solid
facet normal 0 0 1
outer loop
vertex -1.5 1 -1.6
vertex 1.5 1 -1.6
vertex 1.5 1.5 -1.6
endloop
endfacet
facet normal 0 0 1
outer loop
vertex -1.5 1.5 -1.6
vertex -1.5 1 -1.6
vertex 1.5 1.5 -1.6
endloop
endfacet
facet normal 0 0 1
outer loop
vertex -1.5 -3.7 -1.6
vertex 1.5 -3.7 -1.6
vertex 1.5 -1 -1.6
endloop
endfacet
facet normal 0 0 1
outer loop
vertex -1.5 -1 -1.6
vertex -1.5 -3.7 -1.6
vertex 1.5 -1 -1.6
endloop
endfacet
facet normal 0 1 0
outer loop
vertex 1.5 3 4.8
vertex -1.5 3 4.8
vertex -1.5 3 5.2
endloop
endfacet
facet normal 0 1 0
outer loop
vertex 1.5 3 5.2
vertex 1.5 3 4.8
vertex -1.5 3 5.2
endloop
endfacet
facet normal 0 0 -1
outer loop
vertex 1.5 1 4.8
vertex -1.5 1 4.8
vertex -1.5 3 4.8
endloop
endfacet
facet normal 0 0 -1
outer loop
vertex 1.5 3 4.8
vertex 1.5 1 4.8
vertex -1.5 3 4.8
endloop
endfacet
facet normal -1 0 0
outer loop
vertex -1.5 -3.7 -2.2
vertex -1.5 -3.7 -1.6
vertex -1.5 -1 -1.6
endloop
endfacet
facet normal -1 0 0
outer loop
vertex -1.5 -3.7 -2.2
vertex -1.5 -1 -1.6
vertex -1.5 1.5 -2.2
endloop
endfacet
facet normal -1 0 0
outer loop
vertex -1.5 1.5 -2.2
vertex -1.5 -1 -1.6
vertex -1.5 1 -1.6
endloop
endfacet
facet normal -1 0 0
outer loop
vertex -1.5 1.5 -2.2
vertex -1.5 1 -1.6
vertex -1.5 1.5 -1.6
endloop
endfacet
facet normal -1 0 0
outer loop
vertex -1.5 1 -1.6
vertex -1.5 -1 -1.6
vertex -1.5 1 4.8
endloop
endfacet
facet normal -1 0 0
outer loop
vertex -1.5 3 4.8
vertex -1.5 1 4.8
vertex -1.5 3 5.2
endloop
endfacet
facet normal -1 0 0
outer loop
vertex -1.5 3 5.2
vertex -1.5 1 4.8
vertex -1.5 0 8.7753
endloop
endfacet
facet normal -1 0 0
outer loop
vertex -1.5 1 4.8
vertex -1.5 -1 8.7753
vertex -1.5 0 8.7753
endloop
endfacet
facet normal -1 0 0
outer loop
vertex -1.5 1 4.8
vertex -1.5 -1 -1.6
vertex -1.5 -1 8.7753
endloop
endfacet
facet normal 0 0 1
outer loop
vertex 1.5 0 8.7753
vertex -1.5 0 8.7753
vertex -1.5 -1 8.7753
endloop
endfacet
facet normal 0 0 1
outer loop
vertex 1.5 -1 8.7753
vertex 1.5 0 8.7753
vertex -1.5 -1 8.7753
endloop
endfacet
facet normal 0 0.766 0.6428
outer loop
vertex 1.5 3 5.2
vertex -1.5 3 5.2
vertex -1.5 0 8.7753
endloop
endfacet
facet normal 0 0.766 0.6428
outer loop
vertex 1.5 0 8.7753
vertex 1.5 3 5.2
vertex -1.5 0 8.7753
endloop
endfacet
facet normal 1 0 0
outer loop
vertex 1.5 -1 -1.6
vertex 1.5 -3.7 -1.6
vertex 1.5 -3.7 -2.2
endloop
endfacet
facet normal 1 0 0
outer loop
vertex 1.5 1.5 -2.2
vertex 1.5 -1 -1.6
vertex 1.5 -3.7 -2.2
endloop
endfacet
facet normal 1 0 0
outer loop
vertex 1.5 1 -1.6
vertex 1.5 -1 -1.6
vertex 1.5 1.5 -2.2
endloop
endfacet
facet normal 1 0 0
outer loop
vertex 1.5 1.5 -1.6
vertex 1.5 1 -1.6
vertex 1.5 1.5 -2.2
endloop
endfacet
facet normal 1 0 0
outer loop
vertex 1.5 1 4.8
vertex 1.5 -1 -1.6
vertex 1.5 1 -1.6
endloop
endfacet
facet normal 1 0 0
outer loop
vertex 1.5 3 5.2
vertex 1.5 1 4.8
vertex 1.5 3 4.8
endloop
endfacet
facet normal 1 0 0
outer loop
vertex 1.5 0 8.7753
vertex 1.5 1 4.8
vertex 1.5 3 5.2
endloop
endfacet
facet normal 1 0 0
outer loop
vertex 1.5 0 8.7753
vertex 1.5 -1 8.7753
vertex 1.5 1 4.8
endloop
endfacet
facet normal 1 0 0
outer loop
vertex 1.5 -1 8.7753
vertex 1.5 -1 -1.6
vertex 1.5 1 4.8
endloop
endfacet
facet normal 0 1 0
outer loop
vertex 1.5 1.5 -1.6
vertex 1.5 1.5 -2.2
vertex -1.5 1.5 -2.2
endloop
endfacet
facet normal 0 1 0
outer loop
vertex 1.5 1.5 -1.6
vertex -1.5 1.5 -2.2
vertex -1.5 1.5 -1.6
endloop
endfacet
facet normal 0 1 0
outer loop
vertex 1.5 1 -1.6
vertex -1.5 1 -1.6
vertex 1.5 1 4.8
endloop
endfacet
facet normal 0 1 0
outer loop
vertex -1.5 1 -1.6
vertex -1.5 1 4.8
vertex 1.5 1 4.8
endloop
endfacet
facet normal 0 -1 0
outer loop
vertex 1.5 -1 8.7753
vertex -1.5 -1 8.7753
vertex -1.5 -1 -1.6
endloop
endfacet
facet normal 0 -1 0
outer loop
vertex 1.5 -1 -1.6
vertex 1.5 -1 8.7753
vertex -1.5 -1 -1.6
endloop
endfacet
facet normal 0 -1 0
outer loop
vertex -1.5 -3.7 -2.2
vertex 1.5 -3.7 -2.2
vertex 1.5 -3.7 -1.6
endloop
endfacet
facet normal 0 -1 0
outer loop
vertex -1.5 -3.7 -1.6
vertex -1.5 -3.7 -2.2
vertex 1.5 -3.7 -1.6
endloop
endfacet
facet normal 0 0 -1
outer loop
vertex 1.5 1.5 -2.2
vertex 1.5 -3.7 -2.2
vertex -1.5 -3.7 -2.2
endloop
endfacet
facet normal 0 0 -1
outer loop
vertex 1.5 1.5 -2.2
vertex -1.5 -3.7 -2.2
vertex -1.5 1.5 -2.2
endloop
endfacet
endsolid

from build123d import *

# Parameters (mm, degrees)
SKETCH017_W       = 3
SKETCH017_H       = 2
PAD006_DEPTH      = 4.8
PAD006_DEPTH_BACK = 1.6
PAD007_DEPTH      = 3
SKETCH020_W       = 5.2
SKETCH020_H       = 0.6
PAD008_DEPTH      = 3


with BuildPart() as part:
    # Sketch017 → Pad006 (new body, two sides)
    with BuildSketch(Plane.XY) as pad006_sk:
        Rectangle(SKETCH017_W, SKETCH017_H)
    extrude(amount=PAD006_DEPTH)
    extrude(pad006_sk.sketch, amount=-PAD006_DEPTH_BACK)

    # Sketch018 (on Face4 of Pad006) → Pad007 (join)
    with BuildSketch(Plane(origin=(-1.5, 0, 0), x_dir=(0, -1, 0), z_dir=(-1, 0, 0))):
        Polygon((1, 4.8), (-3, 4.8), (-3, 5.2), (0, 8.775261), (1, 8.775261), align=None)
    extrude(amount=-PAD007_DEPTH)

    # Sketch020 (on Face9 of Pad007) → Pad008 (join)
    with BuildSketch(Plane.YZ.offset(1.5)):
        with Locations((-1.1, -1.9)):
            Rectangle(SKETCH020_W, SKETCH020_H)
    extrude(amount=-PAD008_DEPTH)


solid = part.part
